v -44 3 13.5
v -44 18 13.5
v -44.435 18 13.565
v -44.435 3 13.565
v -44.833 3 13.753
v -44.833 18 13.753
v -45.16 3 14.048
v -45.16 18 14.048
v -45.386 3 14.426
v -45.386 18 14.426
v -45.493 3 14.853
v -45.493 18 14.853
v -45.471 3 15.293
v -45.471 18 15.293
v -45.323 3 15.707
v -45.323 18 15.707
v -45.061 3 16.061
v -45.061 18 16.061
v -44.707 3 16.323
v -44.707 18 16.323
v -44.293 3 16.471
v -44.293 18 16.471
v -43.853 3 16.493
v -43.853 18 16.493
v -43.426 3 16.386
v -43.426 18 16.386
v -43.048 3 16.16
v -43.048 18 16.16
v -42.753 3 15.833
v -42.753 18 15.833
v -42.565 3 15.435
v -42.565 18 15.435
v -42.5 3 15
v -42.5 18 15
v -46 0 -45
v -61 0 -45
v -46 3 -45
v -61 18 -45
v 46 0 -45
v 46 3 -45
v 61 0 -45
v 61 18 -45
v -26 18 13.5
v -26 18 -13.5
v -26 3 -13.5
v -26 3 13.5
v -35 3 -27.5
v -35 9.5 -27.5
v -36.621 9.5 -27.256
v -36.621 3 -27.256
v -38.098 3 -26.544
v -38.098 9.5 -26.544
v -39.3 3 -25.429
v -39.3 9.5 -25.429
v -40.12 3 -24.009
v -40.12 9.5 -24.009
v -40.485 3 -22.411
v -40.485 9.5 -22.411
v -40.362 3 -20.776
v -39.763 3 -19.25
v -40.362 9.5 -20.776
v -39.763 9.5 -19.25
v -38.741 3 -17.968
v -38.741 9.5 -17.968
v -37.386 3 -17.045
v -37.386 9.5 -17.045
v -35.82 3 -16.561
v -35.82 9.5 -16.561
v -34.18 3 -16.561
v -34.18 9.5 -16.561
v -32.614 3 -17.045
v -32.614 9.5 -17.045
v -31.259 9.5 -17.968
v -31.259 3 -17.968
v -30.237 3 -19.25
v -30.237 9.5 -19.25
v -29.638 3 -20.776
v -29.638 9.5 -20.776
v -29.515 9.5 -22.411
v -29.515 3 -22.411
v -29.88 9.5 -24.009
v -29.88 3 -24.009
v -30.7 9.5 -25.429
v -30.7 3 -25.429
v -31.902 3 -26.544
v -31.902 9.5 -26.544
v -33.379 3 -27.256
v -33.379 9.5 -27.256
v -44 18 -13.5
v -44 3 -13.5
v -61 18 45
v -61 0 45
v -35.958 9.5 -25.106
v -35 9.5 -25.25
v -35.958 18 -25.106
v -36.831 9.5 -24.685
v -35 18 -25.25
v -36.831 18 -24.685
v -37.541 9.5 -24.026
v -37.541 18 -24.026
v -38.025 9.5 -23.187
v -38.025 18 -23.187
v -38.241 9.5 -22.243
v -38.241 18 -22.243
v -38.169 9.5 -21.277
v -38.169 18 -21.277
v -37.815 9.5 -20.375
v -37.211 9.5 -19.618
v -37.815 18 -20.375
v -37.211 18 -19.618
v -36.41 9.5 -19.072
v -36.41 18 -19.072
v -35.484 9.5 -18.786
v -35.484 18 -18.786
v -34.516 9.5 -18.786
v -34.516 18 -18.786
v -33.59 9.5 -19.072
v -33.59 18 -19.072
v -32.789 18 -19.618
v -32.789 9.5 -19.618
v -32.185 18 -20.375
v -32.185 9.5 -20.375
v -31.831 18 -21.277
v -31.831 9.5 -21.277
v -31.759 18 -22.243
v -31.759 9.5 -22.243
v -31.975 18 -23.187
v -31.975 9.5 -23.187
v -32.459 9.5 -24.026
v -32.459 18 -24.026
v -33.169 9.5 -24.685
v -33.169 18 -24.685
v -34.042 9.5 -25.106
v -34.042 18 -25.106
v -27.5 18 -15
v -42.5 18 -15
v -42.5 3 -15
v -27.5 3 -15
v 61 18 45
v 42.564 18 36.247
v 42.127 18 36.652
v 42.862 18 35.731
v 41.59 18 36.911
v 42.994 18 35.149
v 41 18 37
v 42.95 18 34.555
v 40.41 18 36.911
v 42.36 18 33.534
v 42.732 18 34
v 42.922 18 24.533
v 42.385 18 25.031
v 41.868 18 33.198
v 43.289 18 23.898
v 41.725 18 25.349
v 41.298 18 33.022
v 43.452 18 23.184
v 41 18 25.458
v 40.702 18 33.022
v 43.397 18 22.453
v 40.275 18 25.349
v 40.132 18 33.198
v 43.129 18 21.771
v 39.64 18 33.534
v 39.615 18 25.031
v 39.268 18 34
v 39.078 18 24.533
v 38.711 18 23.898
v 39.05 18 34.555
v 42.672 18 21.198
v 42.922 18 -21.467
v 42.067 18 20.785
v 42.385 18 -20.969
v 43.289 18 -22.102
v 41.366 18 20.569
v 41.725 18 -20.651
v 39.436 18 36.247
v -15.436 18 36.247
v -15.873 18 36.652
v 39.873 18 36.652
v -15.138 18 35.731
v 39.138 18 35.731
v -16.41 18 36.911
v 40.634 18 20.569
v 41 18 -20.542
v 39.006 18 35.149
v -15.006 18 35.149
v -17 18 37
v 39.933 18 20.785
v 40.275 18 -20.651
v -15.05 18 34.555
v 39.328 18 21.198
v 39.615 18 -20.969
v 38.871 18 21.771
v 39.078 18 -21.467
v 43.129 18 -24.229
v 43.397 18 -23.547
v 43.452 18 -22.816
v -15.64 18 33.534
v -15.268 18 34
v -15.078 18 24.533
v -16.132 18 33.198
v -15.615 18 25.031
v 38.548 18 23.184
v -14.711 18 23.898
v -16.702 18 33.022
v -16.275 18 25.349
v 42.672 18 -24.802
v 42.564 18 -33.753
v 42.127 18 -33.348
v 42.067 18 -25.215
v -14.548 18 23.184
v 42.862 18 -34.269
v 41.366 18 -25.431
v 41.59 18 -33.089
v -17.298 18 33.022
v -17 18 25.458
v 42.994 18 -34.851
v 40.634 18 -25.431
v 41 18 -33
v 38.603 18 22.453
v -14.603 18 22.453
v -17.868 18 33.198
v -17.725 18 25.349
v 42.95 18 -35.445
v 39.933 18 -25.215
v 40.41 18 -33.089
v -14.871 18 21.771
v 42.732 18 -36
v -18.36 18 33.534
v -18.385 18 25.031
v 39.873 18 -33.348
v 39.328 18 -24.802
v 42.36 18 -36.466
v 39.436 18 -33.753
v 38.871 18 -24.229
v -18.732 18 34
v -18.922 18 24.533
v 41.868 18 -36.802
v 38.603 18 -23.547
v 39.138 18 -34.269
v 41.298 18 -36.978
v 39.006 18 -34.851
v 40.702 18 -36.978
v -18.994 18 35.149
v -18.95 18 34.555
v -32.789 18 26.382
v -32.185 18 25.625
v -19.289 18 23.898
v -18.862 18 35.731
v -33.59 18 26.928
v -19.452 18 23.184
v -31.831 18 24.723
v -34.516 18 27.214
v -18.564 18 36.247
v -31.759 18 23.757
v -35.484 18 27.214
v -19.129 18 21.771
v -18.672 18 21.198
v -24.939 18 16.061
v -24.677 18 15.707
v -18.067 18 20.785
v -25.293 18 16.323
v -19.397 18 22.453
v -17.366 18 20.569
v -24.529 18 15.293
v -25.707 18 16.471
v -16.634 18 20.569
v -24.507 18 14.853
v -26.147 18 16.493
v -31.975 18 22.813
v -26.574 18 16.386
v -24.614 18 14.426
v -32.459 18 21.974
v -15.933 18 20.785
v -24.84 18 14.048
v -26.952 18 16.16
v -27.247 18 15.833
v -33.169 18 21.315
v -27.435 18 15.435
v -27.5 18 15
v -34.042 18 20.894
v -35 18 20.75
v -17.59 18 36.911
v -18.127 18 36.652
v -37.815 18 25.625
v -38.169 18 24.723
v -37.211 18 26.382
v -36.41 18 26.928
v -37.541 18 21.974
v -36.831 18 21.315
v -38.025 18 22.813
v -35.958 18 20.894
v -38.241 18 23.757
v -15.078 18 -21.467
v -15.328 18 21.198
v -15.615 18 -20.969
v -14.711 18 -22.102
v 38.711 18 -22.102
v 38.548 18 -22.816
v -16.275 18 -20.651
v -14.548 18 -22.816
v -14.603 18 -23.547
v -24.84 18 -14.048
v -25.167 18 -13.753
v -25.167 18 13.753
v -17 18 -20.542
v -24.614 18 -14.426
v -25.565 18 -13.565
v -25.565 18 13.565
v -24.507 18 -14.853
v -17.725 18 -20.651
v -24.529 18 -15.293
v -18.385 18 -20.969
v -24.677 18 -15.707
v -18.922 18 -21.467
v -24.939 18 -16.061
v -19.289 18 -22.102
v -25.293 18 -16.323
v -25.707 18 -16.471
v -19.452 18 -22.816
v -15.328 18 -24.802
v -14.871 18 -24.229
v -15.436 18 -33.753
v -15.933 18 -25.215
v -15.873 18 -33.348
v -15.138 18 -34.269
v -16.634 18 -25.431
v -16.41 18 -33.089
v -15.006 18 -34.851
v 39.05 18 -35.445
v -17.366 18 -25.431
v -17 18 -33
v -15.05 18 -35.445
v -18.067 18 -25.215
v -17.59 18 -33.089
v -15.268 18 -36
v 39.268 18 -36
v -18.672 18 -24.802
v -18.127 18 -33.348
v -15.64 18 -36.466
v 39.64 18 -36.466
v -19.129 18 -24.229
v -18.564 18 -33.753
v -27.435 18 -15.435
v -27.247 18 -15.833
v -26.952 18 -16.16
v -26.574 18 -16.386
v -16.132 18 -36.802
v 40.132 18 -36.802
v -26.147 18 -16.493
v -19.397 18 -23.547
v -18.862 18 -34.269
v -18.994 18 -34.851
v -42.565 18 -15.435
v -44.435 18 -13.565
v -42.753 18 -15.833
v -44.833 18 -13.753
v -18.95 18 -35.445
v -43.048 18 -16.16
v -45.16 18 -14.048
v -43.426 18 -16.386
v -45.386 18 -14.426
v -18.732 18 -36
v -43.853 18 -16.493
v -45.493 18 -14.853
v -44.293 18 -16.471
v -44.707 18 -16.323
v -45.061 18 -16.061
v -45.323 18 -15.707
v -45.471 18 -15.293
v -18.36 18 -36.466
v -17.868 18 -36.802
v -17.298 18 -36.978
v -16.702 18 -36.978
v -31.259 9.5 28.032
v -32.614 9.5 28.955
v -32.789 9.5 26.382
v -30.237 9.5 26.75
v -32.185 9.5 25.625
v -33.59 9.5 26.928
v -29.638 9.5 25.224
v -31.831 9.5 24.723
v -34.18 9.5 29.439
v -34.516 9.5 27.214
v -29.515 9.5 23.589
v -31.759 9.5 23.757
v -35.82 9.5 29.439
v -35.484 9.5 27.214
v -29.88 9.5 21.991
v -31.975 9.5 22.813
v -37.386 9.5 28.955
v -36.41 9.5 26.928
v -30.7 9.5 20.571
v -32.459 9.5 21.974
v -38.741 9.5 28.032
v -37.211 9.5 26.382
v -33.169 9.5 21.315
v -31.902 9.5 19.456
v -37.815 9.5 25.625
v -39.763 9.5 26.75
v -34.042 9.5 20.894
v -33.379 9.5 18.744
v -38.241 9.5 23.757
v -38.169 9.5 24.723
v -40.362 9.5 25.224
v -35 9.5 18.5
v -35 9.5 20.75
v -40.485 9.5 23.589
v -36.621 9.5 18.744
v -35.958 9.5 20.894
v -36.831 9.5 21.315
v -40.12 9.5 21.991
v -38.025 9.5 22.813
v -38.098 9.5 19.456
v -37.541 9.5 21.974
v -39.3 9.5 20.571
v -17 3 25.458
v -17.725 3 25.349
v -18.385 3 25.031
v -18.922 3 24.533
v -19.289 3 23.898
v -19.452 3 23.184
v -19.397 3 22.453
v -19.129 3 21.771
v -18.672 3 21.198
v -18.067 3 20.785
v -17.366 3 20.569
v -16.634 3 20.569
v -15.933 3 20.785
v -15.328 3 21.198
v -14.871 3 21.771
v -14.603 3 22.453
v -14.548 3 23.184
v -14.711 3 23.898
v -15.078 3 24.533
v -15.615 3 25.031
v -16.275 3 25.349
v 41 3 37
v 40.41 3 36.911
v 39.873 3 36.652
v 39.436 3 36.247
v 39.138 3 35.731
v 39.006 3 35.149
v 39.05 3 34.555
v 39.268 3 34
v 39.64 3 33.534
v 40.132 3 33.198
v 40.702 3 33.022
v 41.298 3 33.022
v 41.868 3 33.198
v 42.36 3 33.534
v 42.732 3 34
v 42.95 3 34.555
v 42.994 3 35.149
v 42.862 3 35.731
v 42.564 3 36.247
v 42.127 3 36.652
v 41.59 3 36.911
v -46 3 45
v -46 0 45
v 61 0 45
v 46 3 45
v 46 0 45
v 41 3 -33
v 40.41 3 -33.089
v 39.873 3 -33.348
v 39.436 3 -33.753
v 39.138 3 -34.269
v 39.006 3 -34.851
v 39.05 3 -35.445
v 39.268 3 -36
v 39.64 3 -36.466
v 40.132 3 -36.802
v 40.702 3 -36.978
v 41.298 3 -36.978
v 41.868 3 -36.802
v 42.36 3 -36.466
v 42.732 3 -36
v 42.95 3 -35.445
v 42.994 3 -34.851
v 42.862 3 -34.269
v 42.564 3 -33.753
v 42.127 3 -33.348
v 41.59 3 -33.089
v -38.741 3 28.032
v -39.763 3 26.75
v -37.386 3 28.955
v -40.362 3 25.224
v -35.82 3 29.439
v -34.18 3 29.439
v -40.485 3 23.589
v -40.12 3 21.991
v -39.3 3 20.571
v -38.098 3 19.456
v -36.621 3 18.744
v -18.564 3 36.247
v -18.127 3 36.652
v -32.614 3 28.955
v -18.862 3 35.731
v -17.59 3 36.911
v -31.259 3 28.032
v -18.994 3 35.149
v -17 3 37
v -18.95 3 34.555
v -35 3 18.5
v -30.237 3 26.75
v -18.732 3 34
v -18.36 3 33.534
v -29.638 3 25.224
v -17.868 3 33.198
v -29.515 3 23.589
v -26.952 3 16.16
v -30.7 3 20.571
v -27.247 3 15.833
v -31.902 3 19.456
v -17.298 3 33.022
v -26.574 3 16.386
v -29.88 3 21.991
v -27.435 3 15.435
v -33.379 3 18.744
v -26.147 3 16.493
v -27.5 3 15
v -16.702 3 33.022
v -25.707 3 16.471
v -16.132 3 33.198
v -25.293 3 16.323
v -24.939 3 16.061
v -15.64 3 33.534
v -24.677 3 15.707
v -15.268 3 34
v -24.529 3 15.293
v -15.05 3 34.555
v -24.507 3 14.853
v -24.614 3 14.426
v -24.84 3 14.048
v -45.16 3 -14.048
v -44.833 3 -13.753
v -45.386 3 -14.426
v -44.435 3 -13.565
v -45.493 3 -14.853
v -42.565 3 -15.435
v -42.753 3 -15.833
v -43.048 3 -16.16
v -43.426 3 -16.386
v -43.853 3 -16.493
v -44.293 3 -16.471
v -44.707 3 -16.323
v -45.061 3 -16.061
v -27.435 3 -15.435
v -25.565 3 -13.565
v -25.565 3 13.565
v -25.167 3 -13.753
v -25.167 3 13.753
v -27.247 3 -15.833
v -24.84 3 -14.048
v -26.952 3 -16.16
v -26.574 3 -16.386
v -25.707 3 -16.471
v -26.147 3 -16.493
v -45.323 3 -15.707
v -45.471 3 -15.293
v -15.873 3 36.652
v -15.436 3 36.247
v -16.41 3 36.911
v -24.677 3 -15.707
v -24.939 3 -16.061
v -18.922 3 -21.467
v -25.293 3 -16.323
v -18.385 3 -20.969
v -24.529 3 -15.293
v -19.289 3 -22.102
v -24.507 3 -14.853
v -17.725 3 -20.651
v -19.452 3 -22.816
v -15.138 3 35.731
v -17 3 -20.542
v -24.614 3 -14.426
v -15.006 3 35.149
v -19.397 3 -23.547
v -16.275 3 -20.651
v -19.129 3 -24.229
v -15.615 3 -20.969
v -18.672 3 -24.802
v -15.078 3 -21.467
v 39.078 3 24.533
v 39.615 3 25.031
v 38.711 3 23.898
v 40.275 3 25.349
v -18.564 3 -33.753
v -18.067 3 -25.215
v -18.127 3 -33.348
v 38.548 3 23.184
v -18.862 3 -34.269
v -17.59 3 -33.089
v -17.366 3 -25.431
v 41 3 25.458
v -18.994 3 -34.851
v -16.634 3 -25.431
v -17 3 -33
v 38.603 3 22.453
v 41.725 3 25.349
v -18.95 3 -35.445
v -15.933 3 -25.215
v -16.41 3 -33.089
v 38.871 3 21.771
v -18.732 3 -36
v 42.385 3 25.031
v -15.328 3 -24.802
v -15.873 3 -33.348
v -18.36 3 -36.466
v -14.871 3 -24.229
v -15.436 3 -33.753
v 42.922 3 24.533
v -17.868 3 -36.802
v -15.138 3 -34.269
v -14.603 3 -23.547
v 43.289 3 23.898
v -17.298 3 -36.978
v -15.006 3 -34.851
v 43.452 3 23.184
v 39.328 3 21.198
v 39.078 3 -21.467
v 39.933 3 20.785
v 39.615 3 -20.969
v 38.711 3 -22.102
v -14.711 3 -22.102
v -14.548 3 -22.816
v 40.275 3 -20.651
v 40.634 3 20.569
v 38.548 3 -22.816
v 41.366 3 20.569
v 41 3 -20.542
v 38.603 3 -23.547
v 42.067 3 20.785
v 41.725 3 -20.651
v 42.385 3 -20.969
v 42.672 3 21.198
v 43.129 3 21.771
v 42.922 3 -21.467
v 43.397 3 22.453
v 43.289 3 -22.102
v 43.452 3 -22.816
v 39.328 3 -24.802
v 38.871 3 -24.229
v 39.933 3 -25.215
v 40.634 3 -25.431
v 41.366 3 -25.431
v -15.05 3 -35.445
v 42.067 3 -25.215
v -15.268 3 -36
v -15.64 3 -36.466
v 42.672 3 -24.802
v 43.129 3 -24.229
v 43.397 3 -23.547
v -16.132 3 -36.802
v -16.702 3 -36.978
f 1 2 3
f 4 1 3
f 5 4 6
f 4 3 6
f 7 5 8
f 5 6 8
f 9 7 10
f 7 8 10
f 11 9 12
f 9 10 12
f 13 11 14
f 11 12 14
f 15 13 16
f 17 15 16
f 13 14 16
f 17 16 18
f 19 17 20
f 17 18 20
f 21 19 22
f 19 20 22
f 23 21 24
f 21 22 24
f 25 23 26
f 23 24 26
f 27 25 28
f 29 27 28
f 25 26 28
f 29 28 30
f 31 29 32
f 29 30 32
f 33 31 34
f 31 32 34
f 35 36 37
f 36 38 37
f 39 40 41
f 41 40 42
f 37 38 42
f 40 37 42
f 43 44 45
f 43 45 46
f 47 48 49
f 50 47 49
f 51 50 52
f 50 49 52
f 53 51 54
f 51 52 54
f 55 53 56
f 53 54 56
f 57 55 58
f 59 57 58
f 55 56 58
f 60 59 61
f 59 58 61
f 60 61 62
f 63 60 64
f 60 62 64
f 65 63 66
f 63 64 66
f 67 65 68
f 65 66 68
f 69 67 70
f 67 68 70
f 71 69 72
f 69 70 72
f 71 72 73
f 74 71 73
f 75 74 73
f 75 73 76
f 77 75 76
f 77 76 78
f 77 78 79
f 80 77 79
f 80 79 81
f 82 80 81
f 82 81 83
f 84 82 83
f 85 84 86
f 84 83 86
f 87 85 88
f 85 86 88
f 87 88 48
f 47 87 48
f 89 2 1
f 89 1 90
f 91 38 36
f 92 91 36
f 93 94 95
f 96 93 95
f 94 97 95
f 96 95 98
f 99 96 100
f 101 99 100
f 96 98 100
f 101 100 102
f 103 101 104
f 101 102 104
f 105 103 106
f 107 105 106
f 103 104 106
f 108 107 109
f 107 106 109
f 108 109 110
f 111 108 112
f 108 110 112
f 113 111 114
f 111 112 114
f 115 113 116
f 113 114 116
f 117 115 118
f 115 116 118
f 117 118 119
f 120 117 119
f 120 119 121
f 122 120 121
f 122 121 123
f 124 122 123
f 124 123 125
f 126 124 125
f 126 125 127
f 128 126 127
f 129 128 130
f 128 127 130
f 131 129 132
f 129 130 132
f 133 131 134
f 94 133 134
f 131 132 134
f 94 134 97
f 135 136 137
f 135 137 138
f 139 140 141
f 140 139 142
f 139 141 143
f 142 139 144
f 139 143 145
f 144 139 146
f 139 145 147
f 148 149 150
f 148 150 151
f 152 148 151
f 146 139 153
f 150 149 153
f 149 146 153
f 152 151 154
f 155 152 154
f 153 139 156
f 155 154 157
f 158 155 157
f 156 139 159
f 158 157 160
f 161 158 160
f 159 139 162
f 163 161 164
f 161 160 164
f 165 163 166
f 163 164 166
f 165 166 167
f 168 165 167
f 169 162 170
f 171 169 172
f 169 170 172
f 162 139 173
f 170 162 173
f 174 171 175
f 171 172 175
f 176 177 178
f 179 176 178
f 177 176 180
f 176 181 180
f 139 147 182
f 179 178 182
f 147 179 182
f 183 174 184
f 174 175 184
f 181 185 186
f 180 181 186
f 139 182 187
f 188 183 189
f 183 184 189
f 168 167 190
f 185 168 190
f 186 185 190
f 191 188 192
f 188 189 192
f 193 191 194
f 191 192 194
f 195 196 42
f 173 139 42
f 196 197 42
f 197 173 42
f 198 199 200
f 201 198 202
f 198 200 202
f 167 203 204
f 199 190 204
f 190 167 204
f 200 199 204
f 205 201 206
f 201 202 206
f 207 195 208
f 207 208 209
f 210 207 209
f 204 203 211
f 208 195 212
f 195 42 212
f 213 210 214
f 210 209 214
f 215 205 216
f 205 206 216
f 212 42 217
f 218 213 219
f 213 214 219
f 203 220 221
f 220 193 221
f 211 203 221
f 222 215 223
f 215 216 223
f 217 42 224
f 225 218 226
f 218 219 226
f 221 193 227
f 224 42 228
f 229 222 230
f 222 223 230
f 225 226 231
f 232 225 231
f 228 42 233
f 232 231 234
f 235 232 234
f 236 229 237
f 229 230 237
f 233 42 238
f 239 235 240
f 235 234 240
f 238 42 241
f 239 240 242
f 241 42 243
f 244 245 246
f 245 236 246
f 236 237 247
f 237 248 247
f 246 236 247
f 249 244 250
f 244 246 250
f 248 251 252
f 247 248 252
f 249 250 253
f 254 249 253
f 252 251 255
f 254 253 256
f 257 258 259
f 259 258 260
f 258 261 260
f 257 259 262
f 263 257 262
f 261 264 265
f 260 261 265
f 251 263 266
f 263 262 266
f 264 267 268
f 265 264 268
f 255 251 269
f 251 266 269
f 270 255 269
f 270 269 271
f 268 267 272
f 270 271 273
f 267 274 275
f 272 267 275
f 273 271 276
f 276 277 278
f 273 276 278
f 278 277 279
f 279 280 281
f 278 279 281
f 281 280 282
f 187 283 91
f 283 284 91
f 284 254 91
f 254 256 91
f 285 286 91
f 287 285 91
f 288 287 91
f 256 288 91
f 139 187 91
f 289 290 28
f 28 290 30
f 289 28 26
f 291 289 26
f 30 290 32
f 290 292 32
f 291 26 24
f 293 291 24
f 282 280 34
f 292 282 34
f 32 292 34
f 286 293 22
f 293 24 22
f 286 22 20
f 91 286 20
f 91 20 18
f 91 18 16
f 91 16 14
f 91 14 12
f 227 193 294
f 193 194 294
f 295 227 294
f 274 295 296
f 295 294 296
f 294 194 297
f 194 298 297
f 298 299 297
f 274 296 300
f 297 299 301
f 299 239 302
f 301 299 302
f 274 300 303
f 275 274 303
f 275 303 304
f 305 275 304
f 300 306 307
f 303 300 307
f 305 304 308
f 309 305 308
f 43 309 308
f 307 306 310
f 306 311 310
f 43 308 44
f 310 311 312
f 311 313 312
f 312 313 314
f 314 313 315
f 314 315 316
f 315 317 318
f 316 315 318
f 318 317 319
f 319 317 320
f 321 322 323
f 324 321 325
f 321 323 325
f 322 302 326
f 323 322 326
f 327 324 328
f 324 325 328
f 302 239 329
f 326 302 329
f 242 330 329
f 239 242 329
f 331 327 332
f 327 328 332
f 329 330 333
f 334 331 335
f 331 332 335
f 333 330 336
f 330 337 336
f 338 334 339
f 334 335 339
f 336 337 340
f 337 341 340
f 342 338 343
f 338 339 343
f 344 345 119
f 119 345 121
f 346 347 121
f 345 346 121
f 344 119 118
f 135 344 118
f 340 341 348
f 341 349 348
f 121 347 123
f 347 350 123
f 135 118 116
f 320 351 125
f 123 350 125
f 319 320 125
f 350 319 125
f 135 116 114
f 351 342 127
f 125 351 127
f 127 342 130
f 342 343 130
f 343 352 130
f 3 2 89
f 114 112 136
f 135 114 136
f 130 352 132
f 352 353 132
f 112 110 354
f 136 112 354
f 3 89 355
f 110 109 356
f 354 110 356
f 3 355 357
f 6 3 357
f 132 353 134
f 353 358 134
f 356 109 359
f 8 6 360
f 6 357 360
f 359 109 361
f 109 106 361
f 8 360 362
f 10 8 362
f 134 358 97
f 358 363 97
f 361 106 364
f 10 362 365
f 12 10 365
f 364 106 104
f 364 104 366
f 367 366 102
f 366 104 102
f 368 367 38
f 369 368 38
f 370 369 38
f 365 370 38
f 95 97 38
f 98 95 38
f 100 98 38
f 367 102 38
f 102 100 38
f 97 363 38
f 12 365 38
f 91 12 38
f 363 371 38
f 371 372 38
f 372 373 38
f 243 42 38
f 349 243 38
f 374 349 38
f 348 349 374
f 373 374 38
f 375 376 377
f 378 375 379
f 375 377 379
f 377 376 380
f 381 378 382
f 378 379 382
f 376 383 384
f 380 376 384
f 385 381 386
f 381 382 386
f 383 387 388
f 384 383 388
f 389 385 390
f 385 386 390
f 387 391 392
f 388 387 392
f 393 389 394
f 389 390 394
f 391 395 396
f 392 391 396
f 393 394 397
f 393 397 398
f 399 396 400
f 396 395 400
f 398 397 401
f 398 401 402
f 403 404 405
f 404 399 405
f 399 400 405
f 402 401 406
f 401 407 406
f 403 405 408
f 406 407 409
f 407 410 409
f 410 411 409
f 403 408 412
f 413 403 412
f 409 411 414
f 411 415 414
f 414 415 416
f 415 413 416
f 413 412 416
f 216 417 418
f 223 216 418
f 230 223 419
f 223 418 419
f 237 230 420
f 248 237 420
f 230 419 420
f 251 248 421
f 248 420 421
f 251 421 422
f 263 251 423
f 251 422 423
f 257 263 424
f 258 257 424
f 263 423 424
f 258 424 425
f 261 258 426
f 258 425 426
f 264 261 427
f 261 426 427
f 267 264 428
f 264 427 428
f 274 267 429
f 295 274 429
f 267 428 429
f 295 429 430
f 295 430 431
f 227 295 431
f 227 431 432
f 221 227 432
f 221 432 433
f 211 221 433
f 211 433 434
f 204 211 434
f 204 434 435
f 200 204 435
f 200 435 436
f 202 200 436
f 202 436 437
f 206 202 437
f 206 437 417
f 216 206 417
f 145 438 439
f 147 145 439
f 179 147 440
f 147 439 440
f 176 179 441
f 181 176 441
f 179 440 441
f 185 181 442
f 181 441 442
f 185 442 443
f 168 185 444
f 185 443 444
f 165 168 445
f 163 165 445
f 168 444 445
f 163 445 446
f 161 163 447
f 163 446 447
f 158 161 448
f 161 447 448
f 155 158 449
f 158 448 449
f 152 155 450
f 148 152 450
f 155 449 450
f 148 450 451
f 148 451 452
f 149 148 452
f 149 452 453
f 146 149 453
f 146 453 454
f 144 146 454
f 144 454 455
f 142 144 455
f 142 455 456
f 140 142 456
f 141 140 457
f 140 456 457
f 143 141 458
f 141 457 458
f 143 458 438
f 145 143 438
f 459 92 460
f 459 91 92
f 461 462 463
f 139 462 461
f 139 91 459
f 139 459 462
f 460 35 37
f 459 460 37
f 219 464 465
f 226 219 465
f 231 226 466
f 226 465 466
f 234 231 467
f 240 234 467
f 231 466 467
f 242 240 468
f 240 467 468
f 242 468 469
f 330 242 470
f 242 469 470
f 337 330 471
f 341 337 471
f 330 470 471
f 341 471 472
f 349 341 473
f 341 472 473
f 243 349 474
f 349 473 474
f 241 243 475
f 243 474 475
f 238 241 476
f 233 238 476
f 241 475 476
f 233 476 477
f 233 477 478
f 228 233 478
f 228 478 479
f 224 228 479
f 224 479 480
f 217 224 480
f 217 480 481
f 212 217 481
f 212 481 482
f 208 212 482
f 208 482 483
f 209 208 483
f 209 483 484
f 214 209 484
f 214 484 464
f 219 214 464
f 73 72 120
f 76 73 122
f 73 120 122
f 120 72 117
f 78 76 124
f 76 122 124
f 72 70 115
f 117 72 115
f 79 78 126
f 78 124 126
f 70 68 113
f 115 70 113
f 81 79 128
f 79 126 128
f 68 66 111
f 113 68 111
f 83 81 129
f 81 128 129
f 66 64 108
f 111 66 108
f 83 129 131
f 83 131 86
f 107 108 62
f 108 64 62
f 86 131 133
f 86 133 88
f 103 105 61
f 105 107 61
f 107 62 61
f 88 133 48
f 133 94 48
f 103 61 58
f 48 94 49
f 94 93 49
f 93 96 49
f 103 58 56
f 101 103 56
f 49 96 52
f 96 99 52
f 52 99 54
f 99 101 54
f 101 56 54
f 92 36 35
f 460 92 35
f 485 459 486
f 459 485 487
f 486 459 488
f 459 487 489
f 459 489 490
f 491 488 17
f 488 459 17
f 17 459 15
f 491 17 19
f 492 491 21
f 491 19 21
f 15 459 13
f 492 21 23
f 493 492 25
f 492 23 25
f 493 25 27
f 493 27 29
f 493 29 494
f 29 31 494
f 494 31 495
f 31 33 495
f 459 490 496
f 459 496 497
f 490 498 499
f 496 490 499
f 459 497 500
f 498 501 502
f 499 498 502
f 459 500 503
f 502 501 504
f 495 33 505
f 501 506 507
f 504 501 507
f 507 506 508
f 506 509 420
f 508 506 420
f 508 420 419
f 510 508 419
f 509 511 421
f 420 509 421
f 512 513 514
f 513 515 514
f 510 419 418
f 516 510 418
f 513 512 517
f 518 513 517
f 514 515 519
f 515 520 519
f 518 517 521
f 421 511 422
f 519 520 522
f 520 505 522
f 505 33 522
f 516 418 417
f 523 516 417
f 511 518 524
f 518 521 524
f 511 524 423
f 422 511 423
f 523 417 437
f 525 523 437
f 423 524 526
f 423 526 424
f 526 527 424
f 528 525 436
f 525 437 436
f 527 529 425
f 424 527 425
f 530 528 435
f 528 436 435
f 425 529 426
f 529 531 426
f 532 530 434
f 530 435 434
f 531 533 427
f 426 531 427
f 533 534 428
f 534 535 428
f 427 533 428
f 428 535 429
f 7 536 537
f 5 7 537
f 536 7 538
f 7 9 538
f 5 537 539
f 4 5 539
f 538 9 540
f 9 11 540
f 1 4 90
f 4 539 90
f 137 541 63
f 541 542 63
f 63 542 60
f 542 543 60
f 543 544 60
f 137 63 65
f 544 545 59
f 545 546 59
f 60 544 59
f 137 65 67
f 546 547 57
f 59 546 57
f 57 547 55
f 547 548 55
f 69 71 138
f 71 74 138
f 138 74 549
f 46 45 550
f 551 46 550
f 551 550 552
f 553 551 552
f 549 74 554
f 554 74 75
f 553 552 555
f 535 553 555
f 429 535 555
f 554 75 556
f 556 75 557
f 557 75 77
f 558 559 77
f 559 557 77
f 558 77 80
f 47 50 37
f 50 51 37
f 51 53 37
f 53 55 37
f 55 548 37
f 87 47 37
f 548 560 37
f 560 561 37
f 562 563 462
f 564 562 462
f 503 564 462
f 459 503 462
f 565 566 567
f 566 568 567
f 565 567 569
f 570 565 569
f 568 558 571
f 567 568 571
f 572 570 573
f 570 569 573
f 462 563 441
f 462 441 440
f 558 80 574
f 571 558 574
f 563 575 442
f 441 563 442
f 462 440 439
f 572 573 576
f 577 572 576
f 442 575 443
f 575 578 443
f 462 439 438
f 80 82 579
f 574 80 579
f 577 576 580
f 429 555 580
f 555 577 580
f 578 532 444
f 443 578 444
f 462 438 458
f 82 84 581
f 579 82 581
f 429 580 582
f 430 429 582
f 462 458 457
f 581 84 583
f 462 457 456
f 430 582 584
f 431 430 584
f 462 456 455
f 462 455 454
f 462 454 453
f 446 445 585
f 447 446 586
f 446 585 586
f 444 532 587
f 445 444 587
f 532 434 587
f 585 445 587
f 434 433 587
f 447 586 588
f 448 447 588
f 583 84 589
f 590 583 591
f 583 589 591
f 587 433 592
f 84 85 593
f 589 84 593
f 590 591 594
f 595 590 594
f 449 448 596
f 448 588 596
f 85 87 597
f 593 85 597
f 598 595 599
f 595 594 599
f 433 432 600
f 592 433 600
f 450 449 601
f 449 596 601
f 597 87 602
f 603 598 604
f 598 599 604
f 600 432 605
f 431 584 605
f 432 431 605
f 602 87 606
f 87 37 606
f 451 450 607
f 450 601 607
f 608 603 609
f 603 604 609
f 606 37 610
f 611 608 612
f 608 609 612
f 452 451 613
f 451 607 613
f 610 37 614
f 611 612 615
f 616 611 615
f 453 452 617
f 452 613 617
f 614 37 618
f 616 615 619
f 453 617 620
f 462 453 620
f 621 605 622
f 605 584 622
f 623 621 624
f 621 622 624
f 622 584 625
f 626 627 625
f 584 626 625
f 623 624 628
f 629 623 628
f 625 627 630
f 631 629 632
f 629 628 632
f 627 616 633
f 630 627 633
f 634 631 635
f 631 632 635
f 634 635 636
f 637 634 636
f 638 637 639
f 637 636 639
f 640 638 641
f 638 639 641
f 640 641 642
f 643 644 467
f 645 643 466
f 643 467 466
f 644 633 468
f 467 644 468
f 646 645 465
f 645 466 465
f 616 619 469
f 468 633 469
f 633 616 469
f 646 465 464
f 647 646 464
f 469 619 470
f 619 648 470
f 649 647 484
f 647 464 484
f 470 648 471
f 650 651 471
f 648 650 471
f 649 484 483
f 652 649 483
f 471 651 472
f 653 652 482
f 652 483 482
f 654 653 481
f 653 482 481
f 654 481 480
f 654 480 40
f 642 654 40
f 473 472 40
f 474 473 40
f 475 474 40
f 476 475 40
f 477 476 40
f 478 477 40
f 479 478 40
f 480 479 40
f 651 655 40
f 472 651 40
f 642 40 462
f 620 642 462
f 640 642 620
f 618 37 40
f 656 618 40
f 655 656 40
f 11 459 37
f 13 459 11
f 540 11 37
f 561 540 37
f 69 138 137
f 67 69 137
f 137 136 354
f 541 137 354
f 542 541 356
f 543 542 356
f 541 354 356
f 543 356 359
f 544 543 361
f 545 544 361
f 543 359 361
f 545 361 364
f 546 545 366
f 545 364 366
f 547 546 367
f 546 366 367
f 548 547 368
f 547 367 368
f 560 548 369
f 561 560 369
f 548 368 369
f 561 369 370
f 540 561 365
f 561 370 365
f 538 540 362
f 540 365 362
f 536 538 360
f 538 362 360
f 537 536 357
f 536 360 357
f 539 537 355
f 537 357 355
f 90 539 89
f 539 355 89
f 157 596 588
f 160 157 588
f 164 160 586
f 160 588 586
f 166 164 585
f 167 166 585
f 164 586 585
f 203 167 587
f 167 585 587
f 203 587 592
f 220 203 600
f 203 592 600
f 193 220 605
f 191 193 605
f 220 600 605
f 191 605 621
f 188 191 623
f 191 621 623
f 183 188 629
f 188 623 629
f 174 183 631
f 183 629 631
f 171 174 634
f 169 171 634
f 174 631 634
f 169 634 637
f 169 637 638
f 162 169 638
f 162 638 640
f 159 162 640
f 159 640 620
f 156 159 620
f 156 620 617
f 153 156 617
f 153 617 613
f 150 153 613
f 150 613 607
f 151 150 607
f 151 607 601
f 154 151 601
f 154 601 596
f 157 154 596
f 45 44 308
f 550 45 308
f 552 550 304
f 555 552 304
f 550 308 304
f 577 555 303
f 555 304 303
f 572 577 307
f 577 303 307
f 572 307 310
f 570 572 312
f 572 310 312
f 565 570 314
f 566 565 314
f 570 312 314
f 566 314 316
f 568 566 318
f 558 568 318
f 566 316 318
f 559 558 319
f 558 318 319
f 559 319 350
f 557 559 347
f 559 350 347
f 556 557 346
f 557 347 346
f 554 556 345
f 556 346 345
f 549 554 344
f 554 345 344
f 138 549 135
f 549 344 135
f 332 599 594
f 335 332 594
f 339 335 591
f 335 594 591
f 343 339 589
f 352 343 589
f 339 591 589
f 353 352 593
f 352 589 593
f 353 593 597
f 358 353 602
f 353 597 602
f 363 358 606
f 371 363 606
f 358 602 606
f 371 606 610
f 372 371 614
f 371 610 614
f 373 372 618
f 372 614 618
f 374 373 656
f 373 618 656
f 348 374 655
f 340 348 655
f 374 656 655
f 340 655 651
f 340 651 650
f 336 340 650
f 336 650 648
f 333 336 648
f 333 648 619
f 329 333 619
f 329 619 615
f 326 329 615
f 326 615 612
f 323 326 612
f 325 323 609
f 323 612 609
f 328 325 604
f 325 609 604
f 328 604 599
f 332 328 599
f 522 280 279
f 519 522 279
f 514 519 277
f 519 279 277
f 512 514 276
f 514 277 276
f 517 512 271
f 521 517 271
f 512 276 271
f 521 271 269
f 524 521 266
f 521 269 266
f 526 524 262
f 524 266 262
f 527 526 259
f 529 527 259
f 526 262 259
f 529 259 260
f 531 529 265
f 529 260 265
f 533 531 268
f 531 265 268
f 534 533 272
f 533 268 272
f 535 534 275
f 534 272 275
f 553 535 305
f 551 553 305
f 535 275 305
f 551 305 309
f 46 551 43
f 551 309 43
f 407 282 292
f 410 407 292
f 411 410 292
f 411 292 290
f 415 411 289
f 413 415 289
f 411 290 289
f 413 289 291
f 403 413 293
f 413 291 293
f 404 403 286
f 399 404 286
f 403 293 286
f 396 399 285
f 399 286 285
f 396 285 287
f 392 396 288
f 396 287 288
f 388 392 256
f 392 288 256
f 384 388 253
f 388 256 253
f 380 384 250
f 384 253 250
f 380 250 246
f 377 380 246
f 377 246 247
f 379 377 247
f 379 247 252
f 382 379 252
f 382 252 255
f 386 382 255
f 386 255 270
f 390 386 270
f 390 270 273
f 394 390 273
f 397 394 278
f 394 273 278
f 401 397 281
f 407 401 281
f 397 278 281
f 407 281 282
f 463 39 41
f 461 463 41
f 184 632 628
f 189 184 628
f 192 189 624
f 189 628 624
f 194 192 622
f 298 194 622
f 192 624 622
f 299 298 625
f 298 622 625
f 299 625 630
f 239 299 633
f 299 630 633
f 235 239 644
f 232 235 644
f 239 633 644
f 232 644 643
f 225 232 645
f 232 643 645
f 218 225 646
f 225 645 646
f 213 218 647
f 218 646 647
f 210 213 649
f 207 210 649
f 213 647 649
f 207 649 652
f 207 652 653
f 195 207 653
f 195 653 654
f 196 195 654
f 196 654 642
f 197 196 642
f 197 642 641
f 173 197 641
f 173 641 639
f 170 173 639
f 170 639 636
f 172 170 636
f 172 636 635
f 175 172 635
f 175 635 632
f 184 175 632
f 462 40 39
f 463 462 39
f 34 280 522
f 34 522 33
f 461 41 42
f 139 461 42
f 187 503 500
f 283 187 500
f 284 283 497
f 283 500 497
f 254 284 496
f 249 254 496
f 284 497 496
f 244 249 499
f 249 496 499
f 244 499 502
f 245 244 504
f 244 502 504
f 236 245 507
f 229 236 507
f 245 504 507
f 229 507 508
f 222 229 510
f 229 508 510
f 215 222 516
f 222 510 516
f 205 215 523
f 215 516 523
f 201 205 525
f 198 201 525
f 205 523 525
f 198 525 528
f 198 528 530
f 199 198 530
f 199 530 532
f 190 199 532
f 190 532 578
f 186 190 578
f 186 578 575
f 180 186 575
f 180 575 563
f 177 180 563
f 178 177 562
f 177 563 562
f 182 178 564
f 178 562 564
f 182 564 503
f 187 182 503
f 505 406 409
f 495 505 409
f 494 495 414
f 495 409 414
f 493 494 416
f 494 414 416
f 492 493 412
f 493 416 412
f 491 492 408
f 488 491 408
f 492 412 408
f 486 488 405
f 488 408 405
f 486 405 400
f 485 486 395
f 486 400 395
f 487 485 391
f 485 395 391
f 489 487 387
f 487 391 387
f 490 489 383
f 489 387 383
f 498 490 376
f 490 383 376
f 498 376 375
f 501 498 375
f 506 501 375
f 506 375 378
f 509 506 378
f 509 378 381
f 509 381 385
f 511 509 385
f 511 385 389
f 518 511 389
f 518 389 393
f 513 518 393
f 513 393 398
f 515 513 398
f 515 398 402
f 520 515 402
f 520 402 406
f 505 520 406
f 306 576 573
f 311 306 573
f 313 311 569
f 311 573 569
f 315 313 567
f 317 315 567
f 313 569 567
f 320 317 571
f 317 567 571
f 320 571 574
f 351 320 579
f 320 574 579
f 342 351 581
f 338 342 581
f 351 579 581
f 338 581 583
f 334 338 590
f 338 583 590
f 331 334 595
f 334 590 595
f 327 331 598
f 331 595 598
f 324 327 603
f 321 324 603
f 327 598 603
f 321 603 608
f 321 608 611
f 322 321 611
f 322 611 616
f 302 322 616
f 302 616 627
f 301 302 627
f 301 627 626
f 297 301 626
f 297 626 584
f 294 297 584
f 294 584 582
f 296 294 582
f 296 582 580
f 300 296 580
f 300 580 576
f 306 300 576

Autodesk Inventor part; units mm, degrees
ref_plane "YZ Plane" through (0, 0, 0) normal (1, 0, 0) x (0, 1, 0)
ref_plane "XZ Plane" through (0, 0, 0) normal (0, 1, 0) x (-1, 0, 0)
ref_plane "XY Plane" through (0, 0, 0) normal (0, 0, 1) x (1, 0, 0)
sketch "Schizzo3" plane through (0, 0, 0) normal (0, 0, 1) x (1, 0, 0)
  line L0 (-46, 0) -> (-46, 3)
  line L1 (-46, 3) -> (46, 3)
  line L2 (46, 3) -> (46, 0)
  line L3 (46, 0) -> (61, 0)
  line L4 (61, 0) -> (61, 18)
  line L5 (61, 18) -> (-61, 18)
  line L6 (-61, 18) -> (-61, 0)
  line L7 (-61, 0) -> (-46, 0)
  line L8 (0, 0) -> (0, 18)
  point P0 (0, 3)
  dimension "d10" = 122
  dimension "d11" = 92
  dimension "d12" = 18
  dimension "d13" = 3
extrude "Estrusione1" add sketch "Schizzo3" along normal mid plane 90
sketch "Schizzo4" plane through (-61, 18, 45) normal (0, 1, 0) x (1, 0, 0)
  line L0 (0, 90) -> (0, 0) projected
  line L1 (0, 90) -> (122, 90) projected
  line L2 (17, 60) -> (35, 60)
  line L3 (35, 60) -> (35, 30)
  line L4 (35, 30) -> (17, 30)
  line L5 (17, 30) -> (17, 60)
  line L6 (0, 45) -> (122, 45) construction
  line L7 (122, 90) -> (122, 0) construction
  circle A0 centre (17, 60) radius 1.5
  circle A1 centre (35, 60) radius 1.5
  circle A2 centre (35, 30) radius 1.5
  circle A3 centre (17, 30) radius 1.5
  point P0 (61, 45)
  point P1 (26, 68)
  point P2 (44, 80)
  point P3 (44, 68)
  point P4 (102, 80)
  point P5 (102, 68)
  point P6 (18.5, 30)
  point P7 (33.5, 30)
  point P8 (35, 31.5)
  point P9 (35, 58.5)
  point P10 (33.5, 60)
  point P11 (18.5, 60)
  point P12 (17, 58.5)
  point P13 (17, 31.5)
  dimension "d17" = 17
  dimension "d18" = 30
  dimension "d19" = 18
  dimension "d20" = 30
  dimension "d22" = 35
  dimension "d23" = 102
  dimension "d24" = 23
  dimension "d25" = 44
  dimension "d26" = 26
  dimension "d27" = 3
  dimension "d28" = 3
  dimension "d29" = 3
  dimension "d30" = 3
extrude "Estrusione2" cut sketch "Schizzo4" against normal blind 90
hole "Foro1" at (41, 18, -23) at (-17, 18, -23) direction (0, -1, 0) diameter 4.917 end through all thread size "M6x1" class "6H" standard "ISO Metric profile"
hole "Foro2" at (41, 18, -35) at (-17, 18, -35) direction (0, -1, 0) diameter 4 end through all
pattern_linear "Serie rettangolare1" count 2 spacing 46 along (0, 0, 1) of "Foro1"
pattern_linear "Serie rettangolare2" count 2 spacing 70 along (0, 0, 1) of "Foro2"
sketch "Schizzo5" plane through (-46, 3, 45) normal (0, -1, 0) x (1, 0, 0)
  line L0 (-15, -90) -> (-15, 0) projected
  line L1 (92, -90) -> (0, -90) projected
  point P0 (46, -45)
  point P1 (11, -67)
  dimension "d54" = 26
  dimension "d55" = 23
hole "Foro3" at (-35, 3, -22) direction (0, 1, 0) diameter 6.5 end through all counterbore diameter 11 counterbore depth 6.5
pattern_linear "Serie rettangolare3" count 2 spacing 46 along (0, 0, 1) of "Foro3"
properties part number "05-15-2023 esercizi_iogna_serie"
